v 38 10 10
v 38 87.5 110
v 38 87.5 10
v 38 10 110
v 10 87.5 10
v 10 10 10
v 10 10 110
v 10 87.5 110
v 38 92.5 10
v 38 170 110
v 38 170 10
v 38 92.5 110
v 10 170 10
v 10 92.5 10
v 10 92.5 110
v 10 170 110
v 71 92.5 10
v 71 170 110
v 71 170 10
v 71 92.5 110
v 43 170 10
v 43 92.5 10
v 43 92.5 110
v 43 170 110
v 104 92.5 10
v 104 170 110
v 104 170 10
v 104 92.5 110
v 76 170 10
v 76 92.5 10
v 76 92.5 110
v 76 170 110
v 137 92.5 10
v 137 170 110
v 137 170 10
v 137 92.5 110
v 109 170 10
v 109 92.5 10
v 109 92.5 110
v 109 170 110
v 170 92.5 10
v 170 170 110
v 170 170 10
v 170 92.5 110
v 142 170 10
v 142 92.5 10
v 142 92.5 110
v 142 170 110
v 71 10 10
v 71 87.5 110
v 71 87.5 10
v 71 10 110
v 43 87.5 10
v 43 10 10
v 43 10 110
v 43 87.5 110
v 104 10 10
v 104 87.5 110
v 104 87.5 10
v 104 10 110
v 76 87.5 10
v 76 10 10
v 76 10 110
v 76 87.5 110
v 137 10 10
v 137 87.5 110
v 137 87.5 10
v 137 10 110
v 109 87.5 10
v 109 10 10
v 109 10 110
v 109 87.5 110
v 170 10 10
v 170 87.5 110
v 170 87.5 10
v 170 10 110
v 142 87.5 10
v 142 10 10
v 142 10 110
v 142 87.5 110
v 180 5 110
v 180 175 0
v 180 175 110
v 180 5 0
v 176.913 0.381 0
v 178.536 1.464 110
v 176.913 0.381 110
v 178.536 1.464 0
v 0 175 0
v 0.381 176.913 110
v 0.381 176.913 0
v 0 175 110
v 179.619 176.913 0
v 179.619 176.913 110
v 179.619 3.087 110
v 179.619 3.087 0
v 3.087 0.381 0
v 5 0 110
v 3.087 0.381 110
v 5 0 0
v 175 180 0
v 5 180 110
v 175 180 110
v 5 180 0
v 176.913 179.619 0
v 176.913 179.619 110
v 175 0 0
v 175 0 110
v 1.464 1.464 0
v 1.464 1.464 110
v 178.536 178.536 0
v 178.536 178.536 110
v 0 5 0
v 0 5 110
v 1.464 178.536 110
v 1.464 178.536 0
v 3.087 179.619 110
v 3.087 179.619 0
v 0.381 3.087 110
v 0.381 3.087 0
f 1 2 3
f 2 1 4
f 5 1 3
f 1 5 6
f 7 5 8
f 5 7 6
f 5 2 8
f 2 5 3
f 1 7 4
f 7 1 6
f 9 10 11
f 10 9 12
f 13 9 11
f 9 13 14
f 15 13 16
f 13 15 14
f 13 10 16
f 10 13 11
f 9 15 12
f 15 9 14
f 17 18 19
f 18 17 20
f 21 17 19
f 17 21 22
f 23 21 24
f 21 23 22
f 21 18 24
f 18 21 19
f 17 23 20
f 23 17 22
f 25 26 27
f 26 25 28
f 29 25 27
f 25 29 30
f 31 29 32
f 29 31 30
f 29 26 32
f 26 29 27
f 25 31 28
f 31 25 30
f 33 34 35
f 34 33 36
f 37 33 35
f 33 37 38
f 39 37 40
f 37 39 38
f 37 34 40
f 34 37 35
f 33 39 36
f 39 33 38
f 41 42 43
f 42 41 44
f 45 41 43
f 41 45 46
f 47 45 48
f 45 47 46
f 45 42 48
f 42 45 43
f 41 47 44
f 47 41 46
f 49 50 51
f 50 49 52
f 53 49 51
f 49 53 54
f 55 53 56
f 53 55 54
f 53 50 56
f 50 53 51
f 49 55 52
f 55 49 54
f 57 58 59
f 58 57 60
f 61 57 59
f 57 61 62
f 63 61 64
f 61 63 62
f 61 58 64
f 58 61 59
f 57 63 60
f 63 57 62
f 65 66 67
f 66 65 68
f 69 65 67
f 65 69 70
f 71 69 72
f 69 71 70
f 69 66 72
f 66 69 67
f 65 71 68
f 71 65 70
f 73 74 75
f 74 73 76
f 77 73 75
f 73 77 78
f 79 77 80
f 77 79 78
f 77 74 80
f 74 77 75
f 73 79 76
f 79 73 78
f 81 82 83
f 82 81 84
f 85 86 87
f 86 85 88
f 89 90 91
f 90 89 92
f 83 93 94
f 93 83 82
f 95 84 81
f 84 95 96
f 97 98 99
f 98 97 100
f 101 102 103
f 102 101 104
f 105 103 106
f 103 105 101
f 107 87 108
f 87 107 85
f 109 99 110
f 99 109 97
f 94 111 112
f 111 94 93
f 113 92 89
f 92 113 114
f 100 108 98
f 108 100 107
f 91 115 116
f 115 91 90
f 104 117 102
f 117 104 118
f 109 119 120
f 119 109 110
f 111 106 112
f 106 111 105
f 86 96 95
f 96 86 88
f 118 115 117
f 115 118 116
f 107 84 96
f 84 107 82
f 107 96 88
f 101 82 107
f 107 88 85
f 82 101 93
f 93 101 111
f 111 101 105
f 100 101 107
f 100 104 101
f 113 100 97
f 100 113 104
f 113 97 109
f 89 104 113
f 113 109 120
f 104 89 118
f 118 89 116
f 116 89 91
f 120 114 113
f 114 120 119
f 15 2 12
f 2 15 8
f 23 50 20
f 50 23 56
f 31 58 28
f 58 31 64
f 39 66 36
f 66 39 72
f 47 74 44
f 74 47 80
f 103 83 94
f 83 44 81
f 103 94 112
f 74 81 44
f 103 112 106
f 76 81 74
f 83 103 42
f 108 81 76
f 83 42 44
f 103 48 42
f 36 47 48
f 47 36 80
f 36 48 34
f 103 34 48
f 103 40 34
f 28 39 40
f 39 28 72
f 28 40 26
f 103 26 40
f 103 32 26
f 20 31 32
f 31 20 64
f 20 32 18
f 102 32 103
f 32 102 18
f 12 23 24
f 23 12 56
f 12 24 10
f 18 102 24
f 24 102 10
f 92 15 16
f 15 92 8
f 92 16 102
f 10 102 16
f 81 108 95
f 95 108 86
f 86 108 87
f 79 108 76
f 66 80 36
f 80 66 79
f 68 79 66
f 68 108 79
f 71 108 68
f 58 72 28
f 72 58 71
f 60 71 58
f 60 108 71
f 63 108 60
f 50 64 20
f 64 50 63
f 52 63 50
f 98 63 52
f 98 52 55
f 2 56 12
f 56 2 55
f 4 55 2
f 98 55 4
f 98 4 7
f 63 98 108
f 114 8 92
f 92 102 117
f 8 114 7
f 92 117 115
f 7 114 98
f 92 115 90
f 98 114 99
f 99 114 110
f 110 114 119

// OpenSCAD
length = 180;
width = 180;
height = 110;
inside_wall_thickness = 5;
outer_wall_thickness = 10;
base_thickness = 10;

difference()
  {
		translate([outer_wall_thickness-inside_wall_thickness, outer_wall_thickness-inside_wall_thickness, 0])
			{
				minkowski()
					{
						cube(size = [length-outer_wall_thickness*2+inside_wall_thickness*2, width-outer_wall_thickness*2+inside_wall_thickness*2, height-1], center = false);
						cylinder(r=outer_wall_thickness-inside_wall_thickness,h=1);
					}
			}
for(i = [ [outer_wall_thickness, outer_wall_thickness, base_thickness],
			 [outer_wall_thickness,outer_wall_thickness+((((width-(outer_wall_thickness*2)-inside_wall_thickness)/2)+inside_wall_thickness)*1), base_thickness],
			 [outer_wall_thickness+(((length-(outer_wall_thickness*2)-(inside_wall_thickness*4))/5)+inside_wall_thickness)*1,outer_wall_thickness+((((width-(outer_wall_thickness*2)-inside_wall_thickness)/2)+inside_wall_thickness)*1), base_thickness],
			 [outer_wall_thickness+(((length-(outer_wall_thickness*2)-(inside_wall_thickness*4))/5)+inside_wall_thickness)*2,outer_wall_thickness+((((width-(outer_wall_thickness*2)-inside_wall_thickness)/2)+inside_wall_thickness)*1), base_thickness],
			 [outer_wall_thickness+(((length-(outer_wall_thickness*2)-(inside_wall_thickness*4))/5)+inside_wall_thickness)*3,outer_wall_thickness+((((width-(outer_wall_thickness*2)-inside_wall_thickness)/2)+inside_wall_thickness)*1), base_thickness],
			 [outer_wall_thickness+(((length-(outer_wall_thickness*2)-(inside_wall_thickness*4))/5)+inside_wall_thickness)*4,outer_wall_thickness+((((width-(outer_wall_thickness*2)-inside_wall_thickness)/2)+inside_wall_thickness)*1), base_thickness],
			 [outer_wall_thickness+(((length-(outer_wall_thickness*2)-(inside_wall_thickness*4))/5)+inside_wall_thickness)*1,outer_wall_thickness, base_thickness],
			 [outer_wall_thickness+(((length-(outer_wall_thickness*2)-(inside_wall_thickness*4))/5)+inside_wall_thickness)*2,outer_wall_thickness, base_thickness],
			 [outer_wall_thickness+(((length-(outer_wall_thickness*2)-(inside_wall_thickness*4))/5)+inside_wall_thickness)*3,outer_wall_thickness, base_thickness],
			 [outer_wall_thickness+(((length-(outer_wall_thickness*2)-(inside_wall_thickness*4))/5)+inside_wall_thickness)*4,outer_wall_thickness, base_thickness], ])
{
	translate(i)
	cube([(length-(outer_wall_thickness*2)-(inside_wall_thickness*4))/5,(width-(outer_wall_thickness*2)-(inside_wall_thickness))/2,height-base_thickness+1], center = false);
}
}
